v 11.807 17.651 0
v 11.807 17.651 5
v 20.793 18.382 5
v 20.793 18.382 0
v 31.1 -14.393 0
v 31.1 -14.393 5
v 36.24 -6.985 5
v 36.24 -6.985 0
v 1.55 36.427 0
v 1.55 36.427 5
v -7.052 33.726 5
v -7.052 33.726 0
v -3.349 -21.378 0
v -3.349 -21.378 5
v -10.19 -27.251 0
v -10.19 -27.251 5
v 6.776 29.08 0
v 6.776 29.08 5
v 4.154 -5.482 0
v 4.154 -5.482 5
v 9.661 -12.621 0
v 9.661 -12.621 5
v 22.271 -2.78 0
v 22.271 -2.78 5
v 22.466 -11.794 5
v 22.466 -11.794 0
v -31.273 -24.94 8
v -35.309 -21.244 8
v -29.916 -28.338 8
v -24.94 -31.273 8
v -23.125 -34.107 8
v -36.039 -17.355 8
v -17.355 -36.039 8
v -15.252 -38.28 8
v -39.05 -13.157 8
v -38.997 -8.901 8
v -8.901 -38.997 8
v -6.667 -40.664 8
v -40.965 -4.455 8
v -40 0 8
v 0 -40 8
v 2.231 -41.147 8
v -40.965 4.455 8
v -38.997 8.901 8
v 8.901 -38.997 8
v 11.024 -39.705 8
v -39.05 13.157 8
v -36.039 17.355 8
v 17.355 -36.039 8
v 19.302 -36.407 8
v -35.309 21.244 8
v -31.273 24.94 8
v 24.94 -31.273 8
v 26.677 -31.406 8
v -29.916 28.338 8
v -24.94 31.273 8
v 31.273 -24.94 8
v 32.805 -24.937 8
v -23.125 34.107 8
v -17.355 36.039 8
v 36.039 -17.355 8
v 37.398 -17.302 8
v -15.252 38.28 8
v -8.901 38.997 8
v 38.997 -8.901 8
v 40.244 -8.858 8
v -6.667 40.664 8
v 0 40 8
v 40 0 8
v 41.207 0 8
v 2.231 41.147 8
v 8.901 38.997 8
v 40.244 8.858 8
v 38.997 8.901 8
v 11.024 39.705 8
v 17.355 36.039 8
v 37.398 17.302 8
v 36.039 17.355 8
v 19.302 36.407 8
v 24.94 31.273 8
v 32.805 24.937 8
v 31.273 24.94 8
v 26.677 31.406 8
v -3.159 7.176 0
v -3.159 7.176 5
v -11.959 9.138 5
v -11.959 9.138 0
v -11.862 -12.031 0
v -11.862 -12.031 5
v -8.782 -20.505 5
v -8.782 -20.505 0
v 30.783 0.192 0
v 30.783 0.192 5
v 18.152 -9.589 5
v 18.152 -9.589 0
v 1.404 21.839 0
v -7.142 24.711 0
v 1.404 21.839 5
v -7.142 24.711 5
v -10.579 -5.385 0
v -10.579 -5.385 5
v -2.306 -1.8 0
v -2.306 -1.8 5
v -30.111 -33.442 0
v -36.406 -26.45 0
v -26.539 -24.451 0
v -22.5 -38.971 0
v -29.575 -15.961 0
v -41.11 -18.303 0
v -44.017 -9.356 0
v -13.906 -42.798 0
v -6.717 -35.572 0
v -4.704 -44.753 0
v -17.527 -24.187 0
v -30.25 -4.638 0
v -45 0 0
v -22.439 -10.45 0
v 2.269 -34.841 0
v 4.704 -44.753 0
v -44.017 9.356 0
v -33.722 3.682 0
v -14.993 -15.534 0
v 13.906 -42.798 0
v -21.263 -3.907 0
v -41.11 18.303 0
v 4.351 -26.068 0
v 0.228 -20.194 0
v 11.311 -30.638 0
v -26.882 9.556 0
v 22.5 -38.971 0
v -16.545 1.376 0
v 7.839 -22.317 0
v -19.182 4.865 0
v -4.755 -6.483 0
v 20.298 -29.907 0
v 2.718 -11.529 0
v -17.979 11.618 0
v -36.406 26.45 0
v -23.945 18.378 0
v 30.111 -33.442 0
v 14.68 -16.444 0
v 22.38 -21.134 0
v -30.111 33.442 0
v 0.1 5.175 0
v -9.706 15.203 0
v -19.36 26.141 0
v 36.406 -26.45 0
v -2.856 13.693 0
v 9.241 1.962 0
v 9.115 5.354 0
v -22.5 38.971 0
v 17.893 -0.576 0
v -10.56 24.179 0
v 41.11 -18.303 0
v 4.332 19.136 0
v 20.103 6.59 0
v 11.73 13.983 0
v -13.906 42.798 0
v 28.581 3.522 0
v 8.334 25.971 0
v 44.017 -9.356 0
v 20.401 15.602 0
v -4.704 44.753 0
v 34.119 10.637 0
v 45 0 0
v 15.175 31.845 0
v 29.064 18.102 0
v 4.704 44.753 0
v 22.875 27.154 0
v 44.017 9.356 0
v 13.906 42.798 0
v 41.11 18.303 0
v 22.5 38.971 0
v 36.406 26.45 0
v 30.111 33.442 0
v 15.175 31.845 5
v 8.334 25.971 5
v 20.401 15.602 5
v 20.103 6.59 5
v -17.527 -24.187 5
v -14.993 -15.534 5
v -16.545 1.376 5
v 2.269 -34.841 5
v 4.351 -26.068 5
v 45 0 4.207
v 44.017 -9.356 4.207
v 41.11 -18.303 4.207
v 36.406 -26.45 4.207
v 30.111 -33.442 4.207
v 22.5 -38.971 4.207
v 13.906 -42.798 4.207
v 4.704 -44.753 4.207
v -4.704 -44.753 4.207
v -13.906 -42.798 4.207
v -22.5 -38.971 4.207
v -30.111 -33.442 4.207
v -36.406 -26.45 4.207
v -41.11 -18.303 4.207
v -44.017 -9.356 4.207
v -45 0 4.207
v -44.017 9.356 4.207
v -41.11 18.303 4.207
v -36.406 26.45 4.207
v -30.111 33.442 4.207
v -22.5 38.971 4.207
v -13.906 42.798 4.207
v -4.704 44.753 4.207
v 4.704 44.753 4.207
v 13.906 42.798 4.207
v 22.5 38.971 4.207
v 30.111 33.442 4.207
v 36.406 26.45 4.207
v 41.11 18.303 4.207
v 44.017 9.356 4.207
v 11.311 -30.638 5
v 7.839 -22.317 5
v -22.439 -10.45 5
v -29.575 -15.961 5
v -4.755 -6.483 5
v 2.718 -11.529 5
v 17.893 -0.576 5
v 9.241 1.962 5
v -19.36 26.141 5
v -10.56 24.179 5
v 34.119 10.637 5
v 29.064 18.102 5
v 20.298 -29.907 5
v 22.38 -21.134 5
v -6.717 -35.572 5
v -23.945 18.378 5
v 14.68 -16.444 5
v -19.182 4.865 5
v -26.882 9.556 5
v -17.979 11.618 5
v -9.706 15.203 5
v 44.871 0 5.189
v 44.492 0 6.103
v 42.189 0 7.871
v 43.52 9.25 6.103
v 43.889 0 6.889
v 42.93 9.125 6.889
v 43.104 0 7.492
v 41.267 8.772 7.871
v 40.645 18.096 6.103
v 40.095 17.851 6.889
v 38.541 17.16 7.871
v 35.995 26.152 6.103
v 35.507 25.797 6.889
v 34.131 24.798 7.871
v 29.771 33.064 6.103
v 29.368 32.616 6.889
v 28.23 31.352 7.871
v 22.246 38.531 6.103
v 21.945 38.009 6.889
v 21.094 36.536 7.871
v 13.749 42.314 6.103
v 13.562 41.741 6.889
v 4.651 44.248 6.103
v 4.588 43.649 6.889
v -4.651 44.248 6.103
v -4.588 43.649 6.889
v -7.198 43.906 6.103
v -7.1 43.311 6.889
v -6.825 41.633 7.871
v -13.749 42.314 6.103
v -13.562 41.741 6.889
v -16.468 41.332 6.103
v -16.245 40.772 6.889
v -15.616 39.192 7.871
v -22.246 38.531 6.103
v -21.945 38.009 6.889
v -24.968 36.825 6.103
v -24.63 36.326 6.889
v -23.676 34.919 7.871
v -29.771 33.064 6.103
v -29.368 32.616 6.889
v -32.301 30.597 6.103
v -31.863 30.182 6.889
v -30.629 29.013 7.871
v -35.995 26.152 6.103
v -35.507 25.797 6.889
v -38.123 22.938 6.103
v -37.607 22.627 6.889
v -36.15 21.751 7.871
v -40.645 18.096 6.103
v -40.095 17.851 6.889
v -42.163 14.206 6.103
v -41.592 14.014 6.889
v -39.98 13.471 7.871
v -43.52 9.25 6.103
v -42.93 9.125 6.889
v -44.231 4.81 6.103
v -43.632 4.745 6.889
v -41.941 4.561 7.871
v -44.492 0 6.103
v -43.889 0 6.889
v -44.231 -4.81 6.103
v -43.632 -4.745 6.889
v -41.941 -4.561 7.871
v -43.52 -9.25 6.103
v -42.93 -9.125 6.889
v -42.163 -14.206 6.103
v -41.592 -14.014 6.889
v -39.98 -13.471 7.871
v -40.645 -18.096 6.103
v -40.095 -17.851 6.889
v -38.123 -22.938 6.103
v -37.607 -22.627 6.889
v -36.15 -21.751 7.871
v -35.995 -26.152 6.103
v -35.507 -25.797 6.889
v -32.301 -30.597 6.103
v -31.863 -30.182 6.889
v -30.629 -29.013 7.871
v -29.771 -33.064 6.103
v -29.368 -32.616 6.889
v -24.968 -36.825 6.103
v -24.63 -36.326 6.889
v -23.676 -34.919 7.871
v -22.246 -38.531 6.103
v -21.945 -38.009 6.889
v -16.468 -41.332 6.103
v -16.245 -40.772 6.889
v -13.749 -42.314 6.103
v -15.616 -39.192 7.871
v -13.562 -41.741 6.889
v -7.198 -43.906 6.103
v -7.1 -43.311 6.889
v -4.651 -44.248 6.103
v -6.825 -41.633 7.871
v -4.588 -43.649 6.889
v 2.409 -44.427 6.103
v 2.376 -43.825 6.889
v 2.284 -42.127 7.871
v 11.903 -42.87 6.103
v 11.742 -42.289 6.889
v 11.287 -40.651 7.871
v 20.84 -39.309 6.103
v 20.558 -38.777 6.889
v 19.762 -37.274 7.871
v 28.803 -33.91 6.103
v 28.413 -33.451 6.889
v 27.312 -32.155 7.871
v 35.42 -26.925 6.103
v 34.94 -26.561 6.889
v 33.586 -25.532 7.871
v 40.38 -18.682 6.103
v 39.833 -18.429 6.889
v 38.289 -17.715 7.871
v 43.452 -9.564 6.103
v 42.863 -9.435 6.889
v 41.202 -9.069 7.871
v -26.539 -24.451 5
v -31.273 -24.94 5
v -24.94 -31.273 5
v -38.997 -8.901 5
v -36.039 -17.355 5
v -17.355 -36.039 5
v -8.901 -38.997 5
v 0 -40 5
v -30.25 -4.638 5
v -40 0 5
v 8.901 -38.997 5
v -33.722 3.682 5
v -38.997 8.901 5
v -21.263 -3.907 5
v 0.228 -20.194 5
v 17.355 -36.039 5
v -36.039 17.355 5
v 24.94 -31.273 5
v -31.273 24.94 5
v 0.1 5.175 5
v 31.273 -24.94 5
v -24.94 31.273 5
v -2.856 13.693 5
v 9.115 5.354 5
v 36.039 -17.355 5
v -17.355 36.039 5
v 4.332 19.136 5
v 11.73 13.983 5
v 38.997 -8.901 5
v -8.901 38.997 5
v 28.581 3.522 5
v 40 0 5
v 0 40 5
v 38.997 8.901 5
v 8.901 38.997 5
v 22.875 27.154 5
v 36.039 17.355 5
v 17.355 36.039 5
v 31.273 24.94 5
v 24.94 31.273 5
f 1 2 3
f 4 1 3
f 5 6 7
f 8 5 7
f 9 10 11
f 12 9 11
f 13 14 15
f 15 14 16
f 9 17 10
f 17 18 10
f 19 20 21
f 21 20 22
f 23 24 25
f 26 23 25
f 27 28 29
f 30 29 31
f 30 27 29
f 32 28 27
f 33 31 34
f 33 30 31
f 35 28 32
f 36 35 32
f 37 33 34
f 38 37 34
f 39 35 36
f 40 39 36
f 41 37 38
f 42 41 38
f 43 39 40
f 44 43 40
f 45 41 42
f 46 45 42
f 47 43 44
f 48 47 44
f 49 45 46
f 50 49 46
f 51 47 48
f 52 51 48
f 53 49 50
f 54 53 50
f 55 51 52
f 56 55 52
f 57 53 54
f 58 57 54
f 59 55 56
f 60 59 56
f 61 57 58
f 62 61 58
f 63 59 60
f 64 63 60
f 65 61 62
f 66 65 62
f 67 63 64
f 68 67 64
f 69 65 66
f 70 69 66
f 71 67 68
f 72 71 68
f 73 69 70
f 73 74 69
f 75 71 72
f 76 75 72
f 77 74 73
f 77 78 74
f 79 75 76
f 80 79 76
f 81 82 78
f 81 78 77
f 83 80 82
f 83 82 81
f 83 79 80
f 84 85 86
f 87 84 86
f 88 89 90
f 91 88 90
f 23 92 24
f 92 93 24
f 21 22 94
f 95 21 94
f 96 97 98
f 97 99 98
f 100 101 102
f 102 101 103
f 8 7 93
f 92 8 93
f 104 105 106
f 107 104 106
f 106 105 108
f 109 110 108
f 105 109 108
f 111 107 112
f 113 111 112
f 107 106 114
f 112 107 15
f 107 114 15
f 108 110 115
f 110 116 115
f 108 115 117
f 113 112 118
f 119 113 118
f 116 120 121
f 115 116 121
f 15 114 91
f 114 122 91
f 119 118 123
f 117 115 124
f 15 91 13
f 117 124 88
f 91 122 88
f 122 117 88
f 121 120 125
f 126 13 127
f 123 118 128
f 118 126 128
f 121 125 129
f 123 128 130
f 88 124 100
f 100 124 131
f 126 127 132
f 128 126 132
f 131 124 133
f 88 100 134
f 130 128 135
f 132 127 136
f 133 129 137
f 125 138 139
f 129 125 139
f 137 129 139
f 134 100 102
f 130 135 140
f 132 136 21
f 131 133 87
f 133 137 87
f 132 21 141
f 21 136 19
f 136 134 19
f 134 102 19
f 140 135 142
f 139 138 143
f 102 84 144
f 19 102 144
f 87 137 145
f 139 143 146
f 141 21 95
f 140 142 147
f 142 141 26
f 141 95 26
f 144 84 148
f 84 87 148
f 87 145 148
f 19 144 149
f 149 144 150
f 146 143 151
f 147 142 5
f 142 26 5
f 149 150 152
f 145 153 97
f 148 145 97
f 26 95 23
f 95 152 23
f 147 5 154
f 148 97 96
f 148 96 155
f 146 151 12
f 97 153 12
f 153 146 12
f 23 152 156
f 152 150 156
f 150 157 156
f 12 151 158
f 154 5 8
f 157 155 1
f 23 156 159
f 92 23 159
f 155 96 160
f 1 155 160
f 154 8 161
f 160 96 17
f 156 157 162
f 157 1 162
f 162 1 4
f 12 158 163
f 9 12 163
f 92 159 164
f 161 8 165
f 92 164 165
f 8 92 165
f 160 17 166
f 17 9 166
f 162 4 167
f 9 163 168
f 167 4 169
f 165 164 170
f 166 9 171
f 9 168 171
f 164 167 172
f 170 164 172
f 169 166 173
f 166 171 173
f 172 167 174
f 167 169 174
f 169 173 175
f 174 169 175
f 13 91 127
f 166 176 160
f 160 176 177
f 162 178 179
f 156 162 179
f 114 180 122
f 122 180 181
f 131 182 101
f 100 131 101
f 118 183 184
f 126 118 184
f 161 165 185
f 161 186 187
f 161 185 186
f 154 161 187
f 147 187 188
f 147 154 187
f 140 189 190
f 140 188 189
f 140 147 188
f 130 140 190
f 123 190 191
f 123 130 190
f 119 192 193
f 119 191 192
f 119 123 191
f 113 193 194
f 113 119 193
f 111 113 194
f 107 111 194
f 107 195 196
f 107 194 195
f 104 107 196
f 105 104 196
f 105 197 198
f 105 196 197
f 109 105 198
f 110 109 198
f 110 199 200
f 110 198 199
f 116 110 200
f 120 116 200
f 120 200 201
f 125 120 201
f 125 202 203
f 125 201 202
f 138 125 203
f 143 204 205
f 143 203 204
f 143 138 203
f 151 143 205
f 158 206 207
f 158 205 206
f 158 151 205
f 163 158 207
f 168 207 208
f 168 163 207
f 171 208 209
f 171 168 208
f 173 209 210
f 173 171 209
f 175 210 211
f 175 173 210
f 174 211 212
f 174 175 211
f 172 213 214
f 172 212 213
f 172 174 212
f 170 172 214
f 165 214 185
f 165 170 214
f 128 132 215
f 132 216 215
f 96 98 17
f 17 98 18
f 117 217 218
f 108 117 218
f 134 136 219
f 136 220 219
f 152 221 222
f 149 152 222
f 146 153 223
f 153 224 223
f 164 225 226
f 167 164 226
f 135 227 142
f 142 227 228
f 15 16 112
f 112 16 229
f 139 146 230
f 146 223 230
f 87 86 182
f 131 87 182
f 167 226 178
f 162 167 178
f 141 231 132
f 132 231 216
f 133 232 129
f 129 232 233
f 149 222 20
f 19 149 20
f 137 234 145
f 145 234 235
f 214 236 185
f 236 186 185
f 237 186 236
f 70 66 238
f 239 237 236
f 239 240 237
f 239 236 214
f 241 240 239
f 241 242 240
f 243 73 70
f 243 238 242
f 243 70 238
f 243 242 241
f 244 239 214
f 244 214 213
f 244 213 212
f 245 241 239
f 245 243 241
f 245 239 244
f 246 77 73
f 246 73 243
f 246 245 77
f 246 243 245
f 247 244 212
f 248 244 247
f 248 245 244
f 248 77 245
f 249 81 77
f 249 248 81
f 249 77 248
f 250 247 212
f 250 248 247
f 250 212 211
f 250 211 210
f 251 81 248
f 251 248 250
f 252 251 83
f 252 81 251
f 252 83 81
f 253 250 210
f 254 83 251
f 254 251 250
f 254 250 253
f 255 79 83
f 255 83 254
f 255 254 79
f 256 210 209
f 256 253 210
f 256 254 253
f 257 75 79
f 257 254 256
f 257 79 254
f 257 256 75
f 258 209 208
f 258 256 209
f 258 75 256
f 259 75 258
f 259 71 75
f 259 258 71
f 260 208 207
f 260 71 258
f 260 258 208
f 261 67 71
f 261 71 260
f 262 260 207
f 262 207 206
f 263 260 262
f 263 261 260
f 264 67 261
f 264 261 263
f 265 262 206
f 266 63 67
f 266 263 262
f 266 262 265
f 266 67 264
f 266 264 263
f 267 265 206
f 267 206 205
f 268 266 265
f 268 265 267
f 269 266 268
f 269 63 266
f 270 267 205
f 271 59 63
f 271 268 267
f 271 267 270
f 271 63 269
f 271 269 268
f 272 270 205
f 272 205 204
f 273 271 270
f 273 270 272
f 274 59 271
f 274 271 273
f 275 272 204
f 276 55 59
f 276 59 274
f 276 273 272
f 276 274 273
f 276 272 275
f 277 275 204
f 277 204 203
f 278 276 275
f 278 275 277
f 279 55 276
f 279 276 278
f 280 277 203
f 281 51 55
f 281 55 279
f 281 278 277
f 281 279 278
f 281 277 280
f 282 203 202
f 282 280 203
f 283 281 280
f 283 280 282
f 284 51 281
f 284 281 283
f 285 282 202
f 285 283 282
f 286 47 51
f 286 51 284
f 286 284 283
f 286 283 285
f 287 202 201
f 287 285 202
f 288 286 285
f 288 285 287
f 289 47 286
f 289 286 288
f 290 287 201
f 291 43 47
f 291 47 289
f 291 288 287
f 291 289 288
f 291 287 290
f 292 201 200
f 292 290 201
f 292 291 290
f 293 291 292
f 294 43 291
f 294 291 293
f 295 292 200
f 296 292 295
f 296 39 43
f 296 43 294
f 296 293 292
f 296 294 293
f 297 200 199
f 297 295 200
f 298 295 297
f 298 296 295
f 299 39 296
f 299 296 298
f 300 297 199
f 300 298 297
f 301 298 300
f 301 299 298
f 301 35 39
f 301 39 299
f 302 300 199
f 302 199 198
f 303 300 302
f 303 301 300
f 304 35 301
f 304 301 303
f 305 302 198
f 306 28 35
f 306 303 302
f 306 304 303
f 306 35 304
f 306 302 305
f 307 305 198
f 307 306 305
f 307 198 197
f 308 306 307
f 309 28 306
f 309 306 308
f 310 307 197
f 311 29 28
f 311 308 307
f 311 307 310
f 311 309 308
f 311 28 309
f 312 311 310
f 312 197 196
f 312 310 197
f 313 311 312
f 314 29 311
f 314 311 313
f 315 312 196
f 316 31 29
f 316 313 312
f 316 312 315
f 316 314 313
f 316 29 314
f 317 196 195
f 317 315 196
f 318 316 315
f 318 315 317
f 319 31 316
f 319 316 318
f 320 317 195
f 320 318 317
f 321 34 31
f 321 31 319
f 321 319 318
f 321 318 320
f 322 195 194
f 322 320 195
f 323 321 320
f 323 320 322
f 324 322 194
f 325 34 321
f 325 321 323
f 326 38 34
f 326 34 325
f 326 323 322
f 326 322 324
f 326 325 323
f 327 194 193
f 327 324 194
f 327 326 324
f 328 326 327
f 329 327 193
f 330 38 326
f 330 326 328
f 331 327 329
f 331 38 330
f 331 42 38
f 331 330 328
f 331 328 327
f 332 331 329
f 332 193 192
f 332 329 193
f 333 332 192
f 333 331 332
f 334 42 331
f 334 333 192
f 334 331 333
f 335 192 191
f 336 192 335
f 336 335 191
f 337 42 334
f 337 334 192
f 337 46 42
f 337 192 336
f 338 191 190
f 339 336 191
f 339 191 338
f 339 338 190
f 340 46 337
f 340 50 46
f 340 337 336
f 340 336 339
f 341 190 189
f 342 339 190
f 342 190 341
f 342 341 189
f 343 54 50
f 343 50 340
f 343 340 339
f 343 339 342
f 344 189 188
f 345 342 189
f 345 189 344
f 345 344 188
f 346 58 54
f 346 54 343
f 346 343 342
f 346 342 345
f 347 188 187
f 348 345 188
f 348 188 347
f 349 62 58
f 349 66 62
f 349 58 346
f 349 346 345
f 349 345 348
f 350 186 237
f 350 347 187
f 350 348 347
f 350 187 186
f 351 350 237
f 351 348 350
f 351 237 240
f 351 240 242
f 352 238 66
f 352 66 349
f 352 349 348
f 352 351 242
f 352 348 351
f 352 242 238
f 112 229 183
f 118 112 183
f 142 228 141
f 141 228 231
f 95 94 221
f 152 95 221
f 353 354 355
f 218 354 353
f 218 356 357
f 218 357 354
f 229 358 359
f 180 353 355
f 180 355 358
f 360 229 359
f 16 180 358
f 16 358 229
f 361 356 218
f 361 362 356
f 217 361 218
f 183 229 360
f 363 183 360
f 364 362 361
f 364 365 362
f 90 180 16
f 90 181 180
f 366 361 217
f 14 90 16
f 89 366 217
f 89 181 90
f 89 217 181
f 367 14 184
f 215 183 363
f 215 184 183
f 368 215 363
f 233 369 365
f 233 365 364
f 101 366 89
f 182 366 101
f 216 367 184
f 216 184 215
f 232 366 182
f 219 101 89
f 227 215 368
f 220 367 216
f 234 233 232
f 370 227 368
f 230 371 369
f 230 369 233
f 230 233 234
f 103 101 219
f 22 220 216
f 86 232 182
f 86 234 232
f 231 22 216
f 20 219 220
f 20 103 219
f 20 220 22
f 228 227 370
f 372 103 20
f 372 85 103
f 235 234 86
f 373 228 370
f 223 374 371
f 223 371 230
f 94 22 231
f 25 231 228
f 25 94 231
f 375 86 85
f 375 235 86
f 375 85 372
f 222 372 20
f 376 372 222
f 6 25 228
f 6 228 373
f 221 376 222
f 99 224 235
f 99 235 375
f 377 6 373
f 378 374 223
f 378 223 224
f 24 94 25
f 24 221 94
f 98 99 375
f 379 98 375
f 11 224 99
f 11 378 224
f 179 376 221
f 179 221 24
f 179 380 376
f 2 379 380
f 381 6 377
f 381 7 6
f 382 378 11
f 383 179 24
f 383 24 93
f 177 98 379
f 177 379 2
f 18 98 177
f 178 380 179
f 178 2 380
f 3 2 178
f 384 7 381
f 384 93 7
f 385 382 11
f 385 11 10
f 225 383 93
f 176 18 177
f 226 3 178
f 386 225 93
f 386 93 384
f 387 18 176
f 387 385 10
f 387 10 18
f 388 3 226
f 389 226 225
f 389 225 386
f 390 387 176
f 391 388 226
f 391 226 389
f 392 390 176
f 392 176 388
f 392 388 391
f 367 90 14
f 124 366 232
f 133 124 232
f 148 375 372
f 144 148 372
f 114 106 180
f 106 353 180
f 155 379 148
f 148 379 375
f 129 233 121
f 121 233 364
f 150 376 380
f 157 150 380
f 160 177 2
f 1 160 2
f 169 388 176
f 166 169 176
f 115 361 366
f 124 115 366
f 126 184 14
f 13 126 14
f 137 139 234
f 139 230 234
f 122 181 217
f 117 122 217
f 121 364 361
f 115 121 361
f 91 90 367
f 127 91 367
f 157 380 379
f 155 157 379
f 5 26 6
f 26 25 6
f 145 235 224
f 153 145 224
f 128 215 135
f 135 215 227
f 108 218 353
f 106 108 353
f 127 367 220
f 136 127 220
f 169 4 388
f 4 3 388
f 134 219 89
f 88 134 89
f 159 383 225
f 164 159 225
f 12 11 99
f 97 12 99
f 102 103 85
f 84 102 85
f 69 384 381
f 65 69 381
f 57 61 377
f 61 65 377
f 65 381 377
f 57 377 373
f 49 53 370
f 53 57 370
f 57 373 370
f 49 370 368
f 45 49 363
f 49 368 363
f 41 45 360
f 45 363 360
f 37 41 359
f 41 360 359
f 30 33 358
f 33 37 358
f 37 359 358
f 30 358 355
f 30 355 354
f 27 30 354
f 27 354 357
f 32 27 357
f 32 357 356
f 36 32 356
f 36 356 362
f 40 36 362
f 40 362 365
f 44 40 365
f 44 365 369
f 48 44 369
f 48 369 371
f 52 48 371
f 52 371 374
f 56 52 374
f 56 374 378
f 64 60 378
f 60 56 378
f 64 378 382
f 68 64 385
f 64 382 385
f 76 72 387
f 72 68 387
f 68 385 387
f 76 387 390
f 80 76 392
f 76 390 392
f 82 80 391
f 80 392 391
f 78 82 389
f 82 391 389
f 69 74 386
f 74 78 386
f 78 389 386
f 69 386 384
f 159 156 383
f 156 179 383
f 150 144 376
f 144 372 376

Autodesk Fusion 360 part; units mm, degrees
sketch "Sketch1" plane through (0, 0, 0) normal (0, 0, 1) x (1, 0, 0)
  circle A0 centre (0, 0) radius 45
  circle A1 centre (0, 0) radius 40
  dimension "d1" = 90
  dimension "d2" = -5
extrude "Extrude1" add sketch "Sketch1" along normal blind 8
extrude "Extrude2" add sketch "Sketch1" along normal blind 5 contours A1
sketch "Sketch2" plane through (0, 0, 5) normal (0, 0, 1) x (-1, 0, 0)
  line L0 (9.7065, -15.2032) -> (10.5595, -24.1789)
  line L1 (10.5595, -24.1789) -> (19.3595, -26.1413)
  line L2 (19.3595, -26.1413) -> (23.9453, -18.3784)
  line L3 (23.9453, -18.3784) -> (17.9794, -11.6183)
  line L4 (17.9794, -11.6183) -> (9.7065, -15.2032)
  line L5 (2.3064, 1.7998) -> (3.1593, -7.176)
  line L6 (16.5451, -1.3755) -> (10.5792, 5.3847)
  line L7 (10.5792, 5.3847) -> (2.3064, 1.7998)
  line L8 (3.1593, -7.176) -> (11.9594, -9.1384)
  line L9 (11.9594, -9.1384) -> (16.5451, -1.3755)
  line L10 (-0.1005, -5.1751) -> (-9.1149, -5.3544)
  line L11 (-11.73, -13.983) -> (-4.3318, -19.1365)
  line L12 (-4.3318, -19.1365) -> (2.8556, -13.6929)
  line L13 (-9.1149, -5.3544) -> (-11.73, -13.983)
  line L14 (2.8556, -13.6929) -> (-0.1005, -5.1751)
  line L15 (17.5268, 24.1869) -> (14.993, 15.534)
  line L16 (22.4394, 10.4504) -> (29.5752, 15.9614)
  line L17 (29.5752, 15.9614) -> (26.5391, 24.451)
  line L18 (14.993, 15.534) -> (22.4394, 10.4504)
  line L19 (26.5391, 24.451) -> (17.5268, 24.1869)
  line L20 (33.7221, -3.6823) -> (30.2498, 4.6384)
  line L21 (30.2498, 4.6384) -> (21.2633, 3.9073)
  line L22 (19.1816, -4.8653) -> (26.8816, -9.5559)
  line L23 (21.2633, 3.9073) -> (19.1816, -4.8653)
  line L24 (26.8816, -9.5559) -> (33.7221, -3.6823)
  line L25 (7.0524, -33.7264) -> (7.1423, -24.7107)
  line L26 (7.1423, -24.7107) -> (-1.4044, -21.8392)
  line L27 (-1.5498, -36.427) -> (7.0524, -33.7264)
  line L28 (-1.4044, -21.8392) -> (-6.7764, -29.0802)
  line L29 (-6.7764, -29.0802) -> (-1.5498, -36.427)
  line L30 (8.7825, 20.5049) -> (-0.2283, 20.1944)
  line L31 (4.7548, 6.4834) -> (11.8623, 12.031)
  line L32 (11.8623, 12.031) -> (8.7825, 20.5049)
  line L33 (-0.2283, 20.1944) -> (-2.7176, 11.5287)
  line L34 (-2.7176, 11.5287) -> (4.7548, 6.4834)
  line L35 (-9.6613, 12.6209) -> (-18.1524, 9.5888)
  line L36 (-4.1538, 5.4824) -> (-9.6613, 12.6209)
  line L37 (-17.8926, 0.5764) -> (-9.241, -1.9616)
  line L38 (-9.241, -1.9616) -> (-4.1538, 5.4824)
  line L39 (-18.1524, 9.5888) -> (-17.8926, 0.5764)
  line L40 (-29.0638, -18.1025) -> (-20.4014, -15.6016)
  line L41 (-20.1031, -6.5904) -> (-28.5811, -3.522)
  line L42 (-28.5811, -3.522) -> (-34.1191, -10.6369)
  line L43 (-34.1191, -10.6369) -> (-29.0638, -18.1025)
  line L44 (-20.4014, -15.6016) -> (-20.1031, -6.5904)
  line L45 (-20.2979, 29.9068) -> (-22.3795, 21.1342)
  line L46 (-14.6796, 16.4435) -> (-7.8391, 22.3171)
  line L47 (-22.3795, 21.1342) -> (-14.6796, 16.4435)
  line L48 (-7.8391, 22.3171) -> (-11.3114, 30.6379)
  line L49 (-11.3114, 30.6379) -> (-20.2979, 29.9068)
  line L50 (-22.4664, 11.7936) -> (-31.0997, 14.393)
  line L51 (-31.0997, 14.393) -> (-36.2397, 6.9854)
  line L52 (-30.783, -0.1921) -> (-22.2706, 2.7796)
  line L53 (-22.2706, 2.7796) -> (-22.4664, 11.7936)
  line L54 (-36.2397, 6.9854) -> (-30.783, -0.1921)
  line L55 (-4.3507, 26.0684) -> (3.3493, 21.3777)
  line L56 (10.1898, 27.2513) -> (6.7174, 35.5721)
  line L57 (3.3493, 21.3777) -> (10.1898, 27.2513)
  line L58 (-2.2691, 34.841) -> (-4.3507, 26.0684)
  line L59 (6.7174, 35.5721) -> (-2.2691, 34.841)
  line L60 (-15.175, -31.8449) -> (-8.3345, -25.9713)
  line L61 (-11.8069, -17.6506) -> (-20.7934, -18.3817)
  line L62 (-22.875, -27.1543) -> (-15.175, -31.8449)
  line L63 (-8.3345, -25.9713) -> (-11.8069, -17.6506)
  line L64 (-20.7934, -18.3817) -> (-22.875, -27.1543)
  point P0 (16.31, -19.104)
  point P1 (8.9099, -2.1011)
  point P2 (-4.4843, -11.4684)
  point P3 (22.2147, 18.1167)
  point P4 (26.2597, -1.9116)
  point P5 (0.8928, -29.1567)
  point P6 (4.4907, 14.1485)
  point P7 (-11.8202, 5.2614)
  point P8 (-26.4537, -10.8907)
  point P9 (-15.3015, 24.0879)
  point P10 (-28.5719, 7.1519)
  point P11 (6.7127, 26.555)
  point P12 (2.7273, 29.0221)
  point P13 (-15.797, -24.2006)
extrude "Extrude3" cut sketch "Sketch2" against normal through all
fillet "Fillet1" radius 3.793 1 edges at (-41.9547, -16.2727, 8)
